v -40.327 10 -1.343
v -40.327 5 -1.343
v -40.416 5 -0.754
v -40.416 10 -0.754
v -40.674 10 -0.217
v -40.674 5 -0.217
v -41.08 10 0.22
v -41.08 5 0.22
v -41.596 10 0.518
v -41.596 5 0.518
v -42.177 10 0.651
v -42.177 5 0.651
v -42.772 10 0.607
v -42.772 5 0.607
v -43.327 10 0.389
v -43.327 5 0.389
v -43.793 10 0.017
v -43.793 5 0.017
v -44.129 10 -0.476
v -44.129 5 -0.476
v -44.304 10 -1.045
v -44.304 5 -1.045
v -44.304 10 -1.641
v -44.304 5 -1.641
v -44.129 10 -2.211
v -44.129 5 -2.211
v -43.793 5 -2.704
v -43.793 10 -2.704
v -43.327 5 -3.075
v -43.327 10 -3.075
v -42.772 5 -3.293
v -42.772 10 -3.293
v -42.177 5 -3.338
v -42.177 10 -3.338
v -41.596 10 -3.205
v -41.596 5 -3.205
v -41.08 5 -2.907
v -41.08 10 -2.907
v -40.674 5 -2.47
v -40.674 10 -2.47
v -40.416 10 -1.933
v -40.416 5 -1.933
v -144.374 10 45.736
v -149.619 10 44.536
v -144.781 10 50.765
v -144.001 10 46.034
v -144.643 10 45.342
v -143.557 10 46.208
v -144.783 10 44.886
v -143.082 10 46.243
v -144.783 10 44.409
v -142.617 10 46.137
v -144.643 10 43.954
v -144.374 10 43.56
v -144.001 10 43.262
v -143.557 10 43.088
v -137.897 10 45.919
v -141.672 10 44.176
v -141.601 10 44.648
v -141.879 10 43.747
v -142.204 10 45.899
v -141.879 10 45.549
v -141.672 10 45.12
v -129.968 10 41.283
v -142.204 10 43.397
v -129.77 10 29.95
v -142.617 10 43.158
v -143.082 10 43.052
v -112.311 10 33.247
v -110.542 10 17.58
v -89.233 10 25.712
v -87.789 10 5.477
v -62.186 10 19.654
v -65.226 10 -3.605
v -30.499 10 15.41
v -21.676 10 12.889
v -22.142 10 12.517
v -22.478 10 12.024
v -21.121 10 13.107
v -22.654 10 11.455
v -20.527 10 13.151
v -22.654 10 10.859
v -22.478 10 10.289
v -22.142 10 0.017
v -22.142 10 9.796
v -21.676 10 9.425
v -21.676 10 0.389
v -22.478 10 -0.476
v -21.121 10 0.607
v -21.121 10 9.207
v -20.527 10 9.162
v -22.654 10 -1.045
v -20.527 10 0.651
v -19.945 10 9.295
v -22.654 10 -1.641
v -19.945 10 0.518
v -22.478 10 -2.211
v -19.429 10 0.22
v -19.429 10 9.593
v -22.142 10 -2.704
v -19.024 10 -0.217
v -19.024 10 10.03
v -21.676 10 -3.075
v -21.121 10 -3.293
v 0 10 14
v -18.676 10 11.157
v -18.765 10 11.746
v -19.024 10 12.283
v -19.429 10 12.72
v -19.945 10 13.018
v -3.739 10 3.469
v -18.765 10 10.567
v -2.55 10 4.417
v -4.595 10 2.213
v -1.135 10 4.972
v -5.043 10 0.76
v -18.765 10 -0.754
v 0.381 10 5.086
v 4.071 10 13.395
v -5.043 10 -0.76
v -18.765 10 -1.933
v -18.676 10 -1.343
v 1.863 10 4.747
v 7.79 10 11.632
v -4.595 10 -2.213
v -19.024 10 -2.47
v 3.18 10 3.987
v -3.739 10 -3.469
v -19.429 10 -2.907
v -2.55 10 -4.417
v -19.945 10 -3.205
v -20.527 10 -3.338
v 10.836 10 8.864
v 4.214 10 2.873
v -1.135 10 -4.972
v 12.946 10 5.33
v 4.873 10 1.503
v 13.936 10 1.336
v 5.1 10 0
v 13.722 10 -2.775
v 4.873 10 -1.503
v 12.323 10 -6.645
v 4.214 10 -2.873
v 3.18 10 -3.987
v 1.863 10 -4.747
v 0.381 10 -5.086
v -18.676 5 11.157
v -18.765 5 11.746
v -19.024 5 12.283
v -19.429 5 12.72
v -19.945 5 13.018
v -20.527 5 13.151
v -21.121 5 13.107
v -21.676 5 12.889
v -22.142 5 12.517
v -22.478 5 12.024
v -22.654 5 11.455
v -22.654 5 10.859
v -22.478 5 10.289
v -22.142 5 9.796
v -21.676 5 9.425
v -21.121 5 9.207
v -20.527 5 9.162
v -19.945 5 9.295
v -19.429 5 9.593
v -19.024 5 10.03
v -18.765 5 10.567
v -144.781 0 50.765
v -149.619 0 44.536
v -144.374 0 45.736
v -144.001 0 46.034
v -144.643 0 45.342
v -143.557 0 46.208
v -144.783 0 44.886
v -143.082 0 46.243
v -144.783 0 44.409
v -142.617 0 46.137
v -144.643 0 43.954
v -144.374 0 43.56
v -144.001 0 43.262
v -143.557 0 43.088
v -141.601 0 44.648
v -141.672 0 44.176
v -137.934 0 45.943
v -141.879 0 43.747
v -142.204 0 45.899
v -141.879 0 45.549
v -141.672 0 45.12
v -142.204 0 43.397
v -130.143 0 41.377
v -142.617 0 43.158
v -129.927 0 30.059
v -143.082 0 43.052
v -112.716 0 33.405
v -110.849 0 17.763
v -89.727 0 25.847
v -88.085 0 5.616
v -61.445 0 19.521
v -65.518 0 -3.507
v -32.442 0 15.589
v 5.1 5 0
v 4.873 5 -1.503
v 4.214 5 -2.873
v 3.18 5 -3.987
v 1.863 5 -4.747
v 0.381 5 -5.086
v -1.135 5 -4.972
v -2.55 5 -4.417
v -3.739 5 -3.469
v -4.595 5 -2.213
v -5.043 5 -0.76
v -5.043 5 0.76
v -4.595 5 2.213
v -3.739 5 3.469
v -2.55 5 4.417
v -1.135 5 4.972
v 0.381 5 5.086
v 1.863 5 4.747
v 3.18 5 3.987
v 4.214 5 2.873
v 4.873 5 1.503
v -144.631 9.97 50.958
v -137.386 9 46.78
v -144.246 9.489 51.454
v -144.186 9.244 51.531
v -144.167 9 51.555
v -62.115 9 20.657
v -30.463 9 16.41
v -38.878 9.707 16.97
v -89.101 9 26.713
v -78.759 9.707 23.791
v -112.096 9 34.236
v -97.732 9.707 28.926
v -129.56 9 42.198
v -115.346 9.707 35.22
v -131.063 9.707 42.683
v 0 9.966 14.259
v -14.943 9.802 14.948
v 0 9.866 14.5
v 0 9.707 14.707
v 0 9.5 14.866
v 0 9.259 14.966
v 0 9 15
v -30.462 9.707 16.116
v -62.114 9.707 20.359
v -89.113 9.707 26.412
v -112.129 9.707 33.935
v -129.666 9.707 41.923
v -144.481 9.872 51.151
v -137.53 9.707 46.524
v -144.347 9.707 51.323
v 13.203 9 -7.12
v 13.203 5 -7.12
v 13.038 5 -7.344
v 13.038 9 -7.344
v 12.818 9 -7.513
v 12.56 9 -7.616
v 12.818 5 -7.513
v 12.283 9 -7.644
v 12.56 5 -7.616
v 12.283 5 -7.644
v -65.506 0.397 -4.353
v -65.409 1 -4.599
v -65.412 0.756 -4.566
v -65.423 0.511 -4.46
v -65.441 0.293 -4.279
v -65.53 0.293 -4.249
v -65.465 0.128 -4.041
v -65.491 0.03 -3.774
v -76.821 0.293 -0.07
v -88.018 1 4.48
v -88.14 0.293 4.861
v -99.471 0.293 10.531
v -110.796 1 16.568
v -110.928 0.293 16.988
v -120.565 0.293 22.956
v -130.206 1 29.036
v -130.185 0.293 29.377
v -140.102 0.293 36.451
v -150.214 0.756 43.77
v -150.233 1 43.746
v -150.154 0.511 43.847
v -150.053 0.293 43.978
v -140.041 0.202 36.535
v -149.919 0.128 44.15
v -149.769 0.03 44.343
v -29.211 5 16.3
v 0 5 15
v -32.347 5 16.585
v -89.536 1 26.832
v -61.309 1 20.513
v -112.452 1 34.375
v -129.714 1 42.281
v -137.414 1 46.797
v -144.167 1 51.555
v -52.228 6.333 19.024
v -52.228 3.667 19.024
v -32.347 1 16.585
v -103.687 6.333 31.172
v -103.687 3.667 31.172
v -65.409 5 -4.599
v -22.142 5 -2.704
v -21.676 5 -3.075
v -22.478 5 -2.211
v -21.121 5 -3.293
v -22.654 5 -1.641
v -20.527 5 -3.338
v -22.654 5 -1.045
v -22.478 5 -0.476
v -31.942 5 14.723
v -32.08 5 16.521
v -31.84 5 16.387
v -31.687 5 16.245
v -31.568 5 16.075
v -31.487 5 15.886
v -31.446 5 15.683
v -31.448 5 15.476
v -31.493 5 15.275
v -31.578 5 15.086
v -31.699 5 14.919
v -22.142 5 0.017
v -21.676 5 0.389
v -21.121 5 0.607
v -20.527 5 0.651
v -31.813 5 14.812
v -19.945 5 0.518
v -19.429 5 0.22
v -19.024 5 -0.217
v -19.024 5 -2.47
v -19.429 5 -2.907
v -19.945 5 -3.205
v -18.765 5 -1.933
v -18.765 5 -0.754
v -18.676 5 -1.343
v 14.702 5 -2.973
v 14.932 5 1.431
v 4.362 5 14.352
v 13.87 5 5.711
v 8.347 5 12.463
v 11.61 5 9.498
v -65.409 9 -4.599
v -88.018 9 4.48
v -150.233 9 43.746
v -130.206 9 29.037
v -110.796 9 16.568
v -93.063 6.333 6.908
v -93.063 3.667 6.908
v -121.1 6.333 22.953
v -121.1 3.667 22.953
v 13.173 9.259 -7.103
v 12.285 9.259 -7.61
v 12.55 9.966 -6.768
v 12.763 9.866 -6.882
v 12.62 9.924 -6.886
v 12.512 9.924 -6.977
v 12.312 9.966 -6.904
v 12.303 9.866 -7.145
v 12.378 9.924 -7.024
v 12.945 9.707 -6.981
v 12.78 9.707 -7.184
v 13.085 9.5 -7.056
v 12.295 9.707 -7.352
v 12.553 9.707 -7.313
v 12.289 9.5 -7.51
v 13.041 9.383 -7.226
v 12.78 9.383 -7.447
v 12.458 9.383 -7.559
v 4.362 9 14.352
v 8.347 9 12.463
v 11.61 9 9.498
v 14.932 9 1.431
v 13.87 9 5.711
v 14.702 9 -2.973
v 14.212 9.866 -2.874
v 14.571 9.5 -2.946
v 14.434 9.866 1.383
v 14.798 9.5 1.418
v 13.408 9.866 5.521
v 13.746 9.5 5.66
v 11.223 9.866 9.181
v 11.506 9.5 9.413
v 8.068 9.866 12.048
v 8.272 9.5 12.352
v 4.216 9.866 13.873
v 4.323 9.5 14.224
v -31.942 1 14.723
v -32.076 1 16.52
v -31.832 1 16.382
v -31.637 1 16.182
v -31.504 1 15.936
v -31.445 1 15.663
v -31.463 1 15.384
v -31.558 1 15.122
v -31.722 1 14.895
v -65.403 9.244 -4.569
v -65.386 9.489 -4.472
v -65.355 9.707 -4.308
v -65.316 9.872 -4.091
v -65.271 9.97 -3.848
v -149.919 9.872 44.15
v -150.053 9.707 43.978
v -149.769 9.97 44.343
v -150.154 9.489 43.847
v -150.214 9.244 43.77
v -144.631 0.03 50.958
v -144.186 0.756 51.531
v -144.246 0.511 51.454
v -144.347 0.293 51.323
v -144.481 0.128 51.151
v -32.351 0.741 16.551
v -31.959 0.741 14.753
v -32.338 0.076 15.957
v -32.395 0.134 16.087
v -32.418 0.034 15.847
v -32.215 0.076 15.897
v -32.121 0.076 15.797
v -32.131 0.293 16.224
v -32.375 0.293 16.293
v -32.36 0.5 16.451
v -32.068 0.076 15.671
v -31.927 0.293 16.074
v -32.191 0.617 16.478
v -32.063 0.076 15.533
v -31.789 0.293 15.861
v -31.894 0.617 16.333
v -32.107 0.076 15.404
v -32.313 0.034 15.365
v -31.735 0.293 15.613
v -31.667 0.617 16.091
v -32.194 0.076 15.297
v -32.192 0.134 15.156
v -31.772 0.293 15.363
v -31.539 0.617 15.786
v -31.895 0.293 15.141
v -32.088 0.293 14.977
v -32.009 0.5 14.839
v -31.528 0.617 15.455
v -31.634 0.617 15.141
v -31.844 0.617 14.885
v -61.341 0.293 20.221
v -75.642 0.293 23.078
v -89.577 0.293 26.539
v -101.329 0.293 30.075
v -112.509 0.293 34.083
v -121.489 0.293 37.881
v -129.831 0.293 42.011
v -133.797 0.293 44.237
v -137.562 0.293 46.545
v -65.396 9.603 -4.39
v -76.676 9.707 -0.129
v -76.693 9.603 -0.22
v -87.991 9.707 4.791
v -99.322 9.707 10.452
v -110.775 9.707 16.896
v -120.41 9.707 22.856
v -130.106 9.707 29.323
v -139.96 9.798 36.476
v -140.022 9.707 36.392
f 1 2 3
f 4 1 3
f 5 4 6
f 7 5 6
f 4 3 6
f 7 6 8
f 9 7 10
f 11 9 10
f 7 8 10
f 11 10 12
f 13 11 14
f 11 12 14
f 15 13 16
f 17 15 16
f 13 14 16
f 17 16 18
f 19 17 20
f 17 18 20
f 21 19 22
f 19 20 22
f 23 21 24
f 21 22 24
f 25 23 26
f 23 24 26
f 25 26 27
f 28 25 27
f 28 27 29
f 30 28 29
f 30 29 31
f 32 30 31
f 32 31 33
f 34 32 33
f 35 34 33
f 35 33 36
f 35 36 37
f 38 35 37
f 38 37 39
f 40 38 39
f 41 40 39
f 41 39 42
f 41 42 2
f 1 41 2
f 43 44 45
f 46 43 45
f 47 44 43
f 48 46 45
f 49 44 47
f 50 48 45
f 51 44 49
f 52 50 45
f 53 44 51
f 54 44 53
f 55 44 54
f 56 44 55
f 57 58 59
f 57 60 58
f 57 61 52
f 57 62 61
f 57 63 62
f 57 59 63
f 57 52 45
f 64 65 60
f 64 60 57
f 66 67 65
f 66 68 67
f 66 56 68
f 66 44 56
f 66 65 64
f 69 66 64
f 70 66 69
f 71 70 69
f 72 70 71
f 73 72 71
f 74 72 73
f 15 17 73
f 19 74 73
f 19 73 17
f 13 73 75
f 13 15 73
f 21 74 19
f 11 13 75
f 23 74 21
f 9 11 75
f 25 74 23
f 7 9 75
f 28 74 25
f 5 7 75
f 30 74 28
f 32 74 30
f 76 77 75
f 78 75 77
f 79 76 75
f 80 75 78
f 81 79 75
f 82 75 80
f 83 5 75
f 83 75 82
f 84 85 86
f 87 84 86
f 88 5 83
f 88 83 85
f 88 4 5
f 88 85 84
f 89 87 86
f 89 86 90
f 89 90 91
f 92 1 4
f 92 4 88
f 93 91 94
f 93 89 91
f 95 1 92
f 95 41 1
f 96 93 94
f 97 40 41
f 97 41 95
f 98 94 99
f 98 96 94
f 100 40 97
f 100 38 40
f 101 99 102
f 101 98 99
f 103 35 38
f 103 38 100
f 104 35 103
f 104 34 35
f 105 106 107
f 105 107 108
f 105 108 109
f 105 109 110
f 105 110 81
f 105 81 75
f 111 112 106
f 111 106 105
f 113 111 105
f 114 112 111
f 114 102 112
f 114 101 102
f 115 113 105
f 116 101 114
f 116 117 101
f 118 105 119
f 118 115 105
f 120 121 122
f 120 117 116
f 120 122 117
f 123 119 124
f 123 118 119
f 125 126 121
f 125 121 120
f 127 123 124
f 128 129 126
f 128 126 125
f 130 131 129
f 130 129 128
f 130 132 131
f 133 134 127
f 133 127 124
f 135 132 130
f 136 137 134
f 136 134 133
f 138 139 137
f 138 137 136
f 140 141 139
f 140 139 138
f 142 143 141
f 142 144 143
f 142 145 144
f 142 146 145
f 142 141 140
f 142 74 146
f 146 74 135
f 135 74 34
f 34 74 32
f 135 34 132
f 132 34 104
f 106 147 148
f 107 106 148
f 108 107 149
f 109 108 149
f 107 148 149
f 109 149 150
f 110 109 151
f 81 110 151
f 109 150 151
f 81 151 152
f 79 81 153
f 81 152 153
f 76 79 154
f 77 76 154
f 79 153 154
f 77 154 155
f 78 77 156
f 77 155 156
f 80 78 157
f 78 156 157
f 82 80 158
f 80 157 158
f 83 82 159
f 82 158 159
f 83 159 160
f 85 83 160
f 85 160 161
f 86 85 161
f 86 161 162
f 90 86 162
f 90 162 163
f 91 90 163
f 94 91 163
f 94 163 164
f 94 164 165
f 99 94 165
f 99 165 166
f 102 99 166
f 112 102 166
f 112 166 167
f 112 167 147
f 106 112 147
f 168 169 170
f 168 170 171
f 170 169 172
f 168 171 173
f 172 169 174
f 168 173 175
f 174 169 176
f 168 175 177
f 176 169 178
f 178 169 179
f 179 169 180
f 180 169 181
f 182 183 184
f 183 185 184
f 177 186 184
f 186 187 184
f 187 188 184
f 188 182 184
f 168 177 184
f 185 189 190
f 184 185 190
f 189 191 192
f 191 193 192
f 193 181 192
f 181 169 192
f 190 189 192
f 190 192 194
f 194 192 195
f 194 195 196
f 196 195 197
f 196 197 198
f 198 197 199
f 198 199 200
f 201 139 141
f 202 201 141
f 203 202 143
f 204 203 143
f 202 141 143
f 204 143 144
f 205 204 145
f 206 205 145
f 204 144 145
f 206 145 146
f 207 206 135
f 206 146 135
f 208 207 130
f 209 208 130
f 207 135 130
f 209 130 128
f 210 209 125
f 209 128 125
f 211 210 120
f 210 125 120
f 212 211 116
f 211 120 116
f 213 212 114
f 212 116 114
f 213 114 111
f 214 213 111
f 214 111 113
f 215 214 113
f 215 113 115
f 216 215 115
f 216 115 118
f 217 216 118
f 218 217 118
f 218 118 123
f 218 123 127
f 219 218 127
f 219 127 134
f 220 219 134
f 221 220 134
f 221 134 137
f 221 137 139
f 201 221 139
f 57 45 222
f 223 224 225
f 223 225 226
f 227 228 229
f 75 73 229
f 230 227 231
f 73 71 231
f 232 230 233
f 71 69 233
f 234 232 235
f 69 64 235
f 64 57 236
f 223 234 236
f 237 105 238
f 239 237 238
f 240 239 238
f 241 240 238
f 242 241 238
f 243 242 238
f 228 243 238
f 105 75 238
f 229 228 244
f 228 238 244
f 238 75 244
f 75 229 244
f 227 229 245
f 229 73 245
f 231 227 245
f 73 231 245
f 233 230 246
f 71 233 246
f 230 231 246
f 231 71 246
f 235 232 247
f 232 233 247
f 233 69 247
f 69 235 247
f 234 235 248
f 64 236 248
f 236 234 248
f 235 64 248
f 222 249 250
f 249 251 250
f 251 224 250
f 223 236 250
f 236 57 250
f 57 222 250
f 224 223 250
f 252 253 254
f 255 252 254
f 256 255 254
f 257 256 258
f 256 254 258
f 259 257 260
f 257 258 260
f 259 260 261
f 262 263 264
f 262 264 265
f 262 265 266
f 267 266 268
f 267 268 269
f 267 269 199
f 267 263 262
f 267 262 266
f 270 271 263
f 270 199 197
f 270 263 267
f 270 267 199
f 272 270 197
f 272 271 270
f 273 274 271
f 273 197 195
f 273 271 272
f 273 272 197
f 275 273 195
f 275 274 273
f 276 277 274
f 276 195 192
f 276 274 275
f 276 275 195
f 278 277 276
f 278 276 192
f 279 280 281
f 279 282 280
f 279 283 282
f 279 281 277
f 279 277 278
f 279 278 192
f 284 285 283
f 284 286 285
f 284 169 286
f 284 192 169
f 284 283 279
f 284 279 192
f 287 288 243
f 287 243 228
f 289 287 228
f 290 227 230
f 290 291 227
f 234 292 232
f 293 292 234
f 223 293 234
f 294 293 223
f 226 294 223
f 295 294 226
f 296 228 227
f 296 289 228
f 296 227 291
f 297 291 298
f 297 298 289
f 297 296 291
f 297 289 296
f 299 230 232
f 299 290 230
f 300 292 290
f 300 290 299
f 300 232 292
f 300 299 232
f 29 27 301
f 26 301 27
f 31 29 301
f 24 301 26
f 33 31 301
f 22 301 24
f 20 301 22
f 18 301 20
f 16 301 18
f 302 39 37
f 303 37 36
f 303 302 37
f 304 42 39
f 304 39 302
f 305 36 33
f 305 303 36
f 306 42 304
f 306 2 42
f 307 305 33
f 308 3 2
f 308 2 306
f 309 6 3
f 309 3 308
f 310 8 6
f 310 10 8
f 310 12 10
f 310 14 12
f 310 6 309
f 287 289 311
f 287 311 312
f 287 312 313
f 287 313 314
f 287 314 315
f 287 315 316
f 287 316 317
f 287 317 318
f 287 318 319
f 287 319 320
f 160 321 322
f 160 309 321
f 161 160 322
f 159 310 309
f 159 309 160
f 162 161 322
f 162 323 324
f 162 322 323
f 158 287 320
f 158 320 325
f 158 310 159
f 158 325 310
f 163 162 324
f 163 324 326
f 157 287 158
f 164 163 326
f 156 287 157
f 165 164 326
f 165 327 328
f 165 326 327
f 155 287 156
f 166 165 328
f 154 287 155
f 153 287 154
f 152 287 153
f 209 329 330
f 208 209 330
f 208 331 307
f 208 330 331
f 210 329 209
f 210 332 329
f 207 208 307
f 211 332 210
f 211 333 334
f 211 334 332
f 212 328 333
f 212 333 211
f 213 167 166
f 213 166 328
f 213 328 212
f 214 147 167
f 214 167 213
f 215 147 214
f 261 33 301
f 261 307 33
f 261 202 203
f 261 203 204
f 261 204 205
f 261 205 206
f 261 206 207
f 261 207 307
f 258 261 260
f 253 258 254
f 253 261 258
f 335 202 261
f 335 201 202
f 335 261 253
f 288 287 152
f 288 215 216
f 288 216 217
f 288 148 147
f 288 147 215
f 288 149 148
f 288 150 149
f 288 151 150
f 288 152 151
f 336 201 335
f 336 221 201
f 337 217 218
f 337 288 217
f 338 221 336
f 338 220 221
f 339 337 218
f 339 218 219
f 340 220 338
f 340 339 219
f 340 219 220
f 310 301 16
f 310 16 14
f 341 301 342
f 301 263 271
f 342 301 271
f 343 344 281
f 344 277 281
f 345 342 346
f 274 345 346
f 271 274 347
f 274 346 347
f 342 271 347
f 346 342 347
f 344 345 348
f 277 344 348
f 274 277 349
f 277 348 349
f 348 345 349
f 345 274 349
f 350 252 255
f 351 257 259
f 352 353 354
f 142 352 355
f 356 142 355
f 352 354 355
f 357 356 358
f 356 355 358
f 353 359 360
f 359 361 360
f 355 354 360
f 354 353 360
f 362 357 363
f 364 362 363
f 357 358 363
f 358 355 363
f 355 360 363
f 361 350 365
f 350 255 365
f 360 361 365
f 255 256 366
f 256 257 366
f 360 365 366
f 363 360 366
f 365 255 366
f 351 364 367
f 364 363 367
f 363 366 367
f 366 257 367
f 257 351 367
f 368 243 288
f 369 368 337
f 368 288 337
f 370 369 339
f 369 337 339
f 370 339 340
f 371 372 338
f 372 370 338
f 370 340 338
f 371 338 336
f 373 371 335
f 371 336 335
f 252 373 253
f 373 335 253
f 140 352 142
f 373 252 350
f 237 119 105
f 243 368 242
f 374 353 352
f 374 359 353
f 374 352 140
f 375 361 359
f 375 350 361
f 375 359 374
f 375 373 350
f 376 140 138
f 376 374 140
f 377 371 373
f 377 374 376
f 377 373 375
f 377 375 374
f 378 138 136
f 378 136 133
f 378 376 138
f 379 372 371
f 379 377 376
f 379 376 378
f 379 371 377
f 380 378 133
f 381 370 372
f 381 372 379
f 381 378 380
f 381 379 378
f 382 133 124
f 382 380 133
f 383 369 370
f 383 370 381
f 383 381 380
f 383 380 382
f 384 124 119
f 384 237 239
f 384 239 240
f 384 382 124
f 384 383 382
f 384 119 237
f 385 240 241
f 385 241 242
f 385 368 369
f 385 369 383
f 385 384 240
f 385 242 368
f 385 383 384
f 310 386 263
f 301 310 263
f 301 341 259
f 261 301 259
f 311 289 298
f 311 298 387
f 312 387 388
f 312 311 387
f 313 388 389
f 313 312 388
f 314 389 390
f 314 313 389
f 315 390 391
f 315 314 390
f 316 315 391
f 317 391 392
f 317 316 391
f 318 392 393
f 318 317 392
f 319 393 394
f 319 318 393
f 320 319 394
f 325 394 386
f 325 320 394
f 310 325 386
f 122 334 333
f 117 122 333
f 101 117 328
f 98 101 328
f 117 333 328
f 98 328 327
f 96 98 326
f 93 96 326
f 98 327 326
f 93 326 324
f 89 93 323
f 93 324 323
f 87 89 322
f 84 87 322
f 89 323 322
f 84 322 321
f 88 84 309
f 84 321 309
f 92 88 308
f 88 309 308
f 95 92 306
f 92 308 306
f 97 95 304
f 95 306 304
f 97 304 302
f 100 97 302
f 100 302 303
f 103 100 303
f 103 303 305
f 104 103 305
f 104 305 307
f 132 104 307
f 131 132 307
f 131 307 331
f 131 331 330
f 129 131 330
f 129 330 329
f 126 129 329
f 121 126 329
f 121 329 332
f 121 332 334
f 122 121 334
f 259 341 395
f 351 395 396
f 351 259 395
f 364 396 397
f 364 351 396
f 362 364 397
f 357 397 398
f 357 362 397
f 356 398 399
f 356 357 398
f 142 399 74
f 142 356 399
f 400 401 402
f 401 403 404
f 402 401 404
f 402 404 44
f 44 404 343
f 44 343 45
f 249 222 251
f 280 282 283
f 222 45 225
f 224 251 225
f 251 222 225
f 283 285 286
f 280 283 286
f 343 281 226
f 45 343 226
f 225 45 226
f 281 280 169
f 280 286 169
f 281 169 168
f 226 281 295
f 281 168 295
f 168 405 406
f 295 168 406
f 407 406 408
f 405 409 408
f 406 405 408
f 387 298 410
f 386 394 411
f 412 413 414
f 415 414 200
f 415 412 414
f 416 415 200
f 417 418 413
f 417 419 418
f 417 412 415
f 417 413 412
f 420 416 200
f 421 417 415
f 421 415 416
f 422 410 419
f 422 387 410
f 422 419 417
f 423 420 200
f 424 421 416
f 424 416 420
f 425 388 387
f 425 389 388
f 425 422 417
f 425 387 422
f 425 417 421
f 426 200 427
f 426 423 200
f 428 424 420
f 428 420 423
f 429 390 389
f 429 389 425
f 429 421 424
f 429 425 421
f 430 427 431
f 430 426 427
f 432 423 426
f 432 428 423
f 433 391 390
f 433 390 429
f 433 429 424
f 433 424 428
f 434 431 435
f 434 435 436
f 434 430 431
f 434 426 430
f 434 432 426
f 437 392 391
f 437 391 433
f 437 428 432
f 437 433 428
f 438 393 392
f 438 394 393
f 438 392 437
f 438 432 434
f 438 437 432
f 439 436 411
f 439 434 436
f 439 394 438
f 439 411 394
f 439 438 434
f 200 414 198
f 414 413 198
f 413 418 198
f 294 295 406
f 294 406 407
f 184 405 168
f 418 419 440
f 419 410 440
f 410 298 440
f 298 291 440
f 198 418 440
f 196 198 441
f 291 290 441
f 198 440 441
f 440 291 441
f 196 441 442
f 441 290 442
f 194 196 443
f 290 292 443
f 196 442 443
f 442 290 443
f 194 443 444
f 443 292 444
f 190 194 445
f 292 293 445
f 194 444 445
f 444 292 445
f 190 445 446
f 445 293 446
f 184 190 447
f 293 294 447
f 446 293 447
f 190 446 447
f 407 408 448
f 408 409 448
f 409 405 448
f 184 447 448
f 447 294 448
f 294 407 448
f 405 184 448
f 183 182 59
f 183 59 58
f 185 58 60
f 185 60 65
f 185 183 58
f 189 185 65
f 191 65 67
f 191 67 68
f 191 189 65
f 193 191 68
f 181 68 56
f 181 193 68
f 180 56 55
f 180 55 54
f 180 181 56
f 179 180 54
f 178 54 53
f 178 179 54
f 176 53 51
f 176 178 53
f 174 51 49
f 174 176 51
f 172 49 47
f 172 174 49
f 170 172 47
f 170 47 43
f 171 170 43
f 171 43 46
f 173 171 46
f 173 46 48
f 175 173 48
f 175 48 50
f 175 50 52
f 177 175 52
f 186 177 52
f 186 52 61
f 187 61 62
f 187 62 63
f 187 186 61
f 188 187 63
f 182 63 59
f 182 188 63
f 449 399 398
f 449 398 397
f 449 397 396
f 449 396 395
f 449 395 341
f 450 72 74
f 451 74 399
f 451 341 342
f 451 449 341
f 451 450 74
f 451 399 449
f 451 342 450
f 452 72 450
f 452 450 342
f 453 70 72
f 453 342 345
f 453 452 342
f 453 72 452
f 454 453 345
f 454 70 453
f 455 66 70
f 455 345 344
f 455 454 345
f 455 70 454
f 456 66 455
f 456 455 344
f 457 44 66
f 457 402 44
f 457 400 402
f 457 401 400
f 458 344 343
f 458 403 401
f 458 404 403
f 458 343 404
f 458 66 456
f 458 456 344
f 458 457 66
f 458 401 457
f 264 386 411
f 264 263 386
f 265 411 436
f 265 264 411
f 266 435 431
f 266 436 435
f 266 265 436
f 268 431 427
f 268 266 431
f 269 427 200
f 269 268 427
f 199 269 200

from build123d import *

# Parameters (mm, degrees)
SKETCH1_R           = 1.600000009
BOSS_EXTRUDE4_DEPTH = 10
SKETCH2_R           = 15
SKETCH2_R_2         = 5
SKETCH2_R_3         = 1.5
BOSS_EXTRUDE6_DEPTH = 5
CUT_EXTRUDE2_DEPTH  = 5
CUT_EXTRUDE4_DEPTH  = 5
SKETCH7_R           = 5.1
CUT_EXTRUDE3_DEPTH  = 10
FILLET8_R           = 1
SKETCH11_R          = 2
CUT_EXTRUDE5_DEPTH  = 6.0000001


with BuildPart() as part:
    # Sketch1 → Boss-Extrude4 (new body)
    with BuildSketch(Plane(origin=(0, 0, 0), x_dir=(1, 0, 0), z_dir=(0, 1, 0))):
        with BuildLine():
            add(Edge.make_bspline(
                [(0, 15), (-53.333333333, 15), (-97.583219031, -2.850331237), (-150.232513568, -43.746495229)],
                knots=[0, 0, 0, 0, 1, 1, 1, 1], degree=3))
            Line((-150.232513568, -43.746495229), (-144.167390422, -51.554671443))
            add(Edge.make_bspline(
                [(0, -15), (-49.211171547, -15), (-112.5778137, -27.016973048), (-144.167390422, -51.554671443)],
                knots=[0, 0, 0, 0, 1, 1, 1, 1], degree=3))
            ThreePointArc((0, -15), (15, 0), (0, 15))
        make_face()
        with Locations((-143.201137436, -44.647891744)):
            Circle(SKETCH1_R, mode=Mode.SUBTRACT)
    extrude(amount=BOSS_EXTRUDE4_DEPTH)

    # Sketch2 → Boss-Extrude6 (add)
    with BuildSketch(Plane.XZ):
        Circle(SKETCH2_R)
        with Locations((16.383040886, -11.471528727)):
            Circle(SKETCH2_R_2)
        with Locations((16.383040886, -11.471528727)):
            Circle(SKETCH2_R_3, mode=Mode.SUBTRACT)
    extrude(amount=-BOSS_EXTRUDE6_DEPTH)

    # Sketch6 → Cut-Extrude2 (cut)
    with BuildSketch(Plane(origin=(0, 10, 0), x_dir=(1, 0, 0), z_dir=(0, 1, 0))):
        Polygon((-65.408961084, 4.598984297), (12.891910286, 7.668027724), (7.272272722, 26.292385098), (-49.302567283, 23.06136309), align=None)
    extrude(amount=-CUT_EXTRUDE2_DEPTH, mode=Mode.SUBTRACT)

    # Sketch9 → Cut-Extrude4 (cut)
    with BuildSketch(Plane.XZ):
        Polygon((-29.210981827, 16.299928772), (-65.408961084, -4.598984297), (-53.167537272, -38.219205759), (79.787707686, -46.822420026), (23.799304787, 49.274642551), align=None)
    extrude(amount=-CUT_EXTRUDE4_DEPTH, mode=Mode.SUBTRACT)

    # Sketch7 → Cut-Extrude3 (cut)
    with BuildSketch(Plane(origin=(0, 10, 0), x_dir=(1, 0, 0), z_dir=(0, 1, 0))):
        Circle(SKETCH7_R)
    extrude(amount=-CUT_EXTRUDE3_DEPTH, mode=Mode.SUBTRACT)

    # Fillet8
    fillet8_edges = [part.edges().sort_by_distance(p)[0] for p in [
        (-74.858183183, 10, 23.204180957),
        (13.038796261, 10, 7.415510237),
        (-109.827962706, 10, 15.996913206),
        (-26.258525399, 10, -6.13350601),
        (12.891910286, 7.5, -7.668027724),
        (-109.827962706, 0, 15.996913206),
        (-89.056948964, 0, 26.700662707),
        (-47.309971455, 0, 5.850472238),
        (-29.210981827, 2.5, 16.299928772),
    ]]
    fillet(fillet8_edges, radius=FILLET8_R)

    # Sketch11 → Cut-Extrude5 (cut, through all)
    with BuildSketch(Plane.XZ.offset(-5)):
        with Locations((-20.67601836, 11.156706002)):
            Circle(SKETCH11_R)
        with Locations((-20.67601836, -1.343293998)):
            Circle(SKETCH11_R)
        with Locations((-42.326653454, -1.343293998)):
            Circle(SKETCH11_R)
    extrude(amount=-CUT_EXTRUDE5_DEPTH, mode=Mode.SUBTRACT)


solid = part.part
